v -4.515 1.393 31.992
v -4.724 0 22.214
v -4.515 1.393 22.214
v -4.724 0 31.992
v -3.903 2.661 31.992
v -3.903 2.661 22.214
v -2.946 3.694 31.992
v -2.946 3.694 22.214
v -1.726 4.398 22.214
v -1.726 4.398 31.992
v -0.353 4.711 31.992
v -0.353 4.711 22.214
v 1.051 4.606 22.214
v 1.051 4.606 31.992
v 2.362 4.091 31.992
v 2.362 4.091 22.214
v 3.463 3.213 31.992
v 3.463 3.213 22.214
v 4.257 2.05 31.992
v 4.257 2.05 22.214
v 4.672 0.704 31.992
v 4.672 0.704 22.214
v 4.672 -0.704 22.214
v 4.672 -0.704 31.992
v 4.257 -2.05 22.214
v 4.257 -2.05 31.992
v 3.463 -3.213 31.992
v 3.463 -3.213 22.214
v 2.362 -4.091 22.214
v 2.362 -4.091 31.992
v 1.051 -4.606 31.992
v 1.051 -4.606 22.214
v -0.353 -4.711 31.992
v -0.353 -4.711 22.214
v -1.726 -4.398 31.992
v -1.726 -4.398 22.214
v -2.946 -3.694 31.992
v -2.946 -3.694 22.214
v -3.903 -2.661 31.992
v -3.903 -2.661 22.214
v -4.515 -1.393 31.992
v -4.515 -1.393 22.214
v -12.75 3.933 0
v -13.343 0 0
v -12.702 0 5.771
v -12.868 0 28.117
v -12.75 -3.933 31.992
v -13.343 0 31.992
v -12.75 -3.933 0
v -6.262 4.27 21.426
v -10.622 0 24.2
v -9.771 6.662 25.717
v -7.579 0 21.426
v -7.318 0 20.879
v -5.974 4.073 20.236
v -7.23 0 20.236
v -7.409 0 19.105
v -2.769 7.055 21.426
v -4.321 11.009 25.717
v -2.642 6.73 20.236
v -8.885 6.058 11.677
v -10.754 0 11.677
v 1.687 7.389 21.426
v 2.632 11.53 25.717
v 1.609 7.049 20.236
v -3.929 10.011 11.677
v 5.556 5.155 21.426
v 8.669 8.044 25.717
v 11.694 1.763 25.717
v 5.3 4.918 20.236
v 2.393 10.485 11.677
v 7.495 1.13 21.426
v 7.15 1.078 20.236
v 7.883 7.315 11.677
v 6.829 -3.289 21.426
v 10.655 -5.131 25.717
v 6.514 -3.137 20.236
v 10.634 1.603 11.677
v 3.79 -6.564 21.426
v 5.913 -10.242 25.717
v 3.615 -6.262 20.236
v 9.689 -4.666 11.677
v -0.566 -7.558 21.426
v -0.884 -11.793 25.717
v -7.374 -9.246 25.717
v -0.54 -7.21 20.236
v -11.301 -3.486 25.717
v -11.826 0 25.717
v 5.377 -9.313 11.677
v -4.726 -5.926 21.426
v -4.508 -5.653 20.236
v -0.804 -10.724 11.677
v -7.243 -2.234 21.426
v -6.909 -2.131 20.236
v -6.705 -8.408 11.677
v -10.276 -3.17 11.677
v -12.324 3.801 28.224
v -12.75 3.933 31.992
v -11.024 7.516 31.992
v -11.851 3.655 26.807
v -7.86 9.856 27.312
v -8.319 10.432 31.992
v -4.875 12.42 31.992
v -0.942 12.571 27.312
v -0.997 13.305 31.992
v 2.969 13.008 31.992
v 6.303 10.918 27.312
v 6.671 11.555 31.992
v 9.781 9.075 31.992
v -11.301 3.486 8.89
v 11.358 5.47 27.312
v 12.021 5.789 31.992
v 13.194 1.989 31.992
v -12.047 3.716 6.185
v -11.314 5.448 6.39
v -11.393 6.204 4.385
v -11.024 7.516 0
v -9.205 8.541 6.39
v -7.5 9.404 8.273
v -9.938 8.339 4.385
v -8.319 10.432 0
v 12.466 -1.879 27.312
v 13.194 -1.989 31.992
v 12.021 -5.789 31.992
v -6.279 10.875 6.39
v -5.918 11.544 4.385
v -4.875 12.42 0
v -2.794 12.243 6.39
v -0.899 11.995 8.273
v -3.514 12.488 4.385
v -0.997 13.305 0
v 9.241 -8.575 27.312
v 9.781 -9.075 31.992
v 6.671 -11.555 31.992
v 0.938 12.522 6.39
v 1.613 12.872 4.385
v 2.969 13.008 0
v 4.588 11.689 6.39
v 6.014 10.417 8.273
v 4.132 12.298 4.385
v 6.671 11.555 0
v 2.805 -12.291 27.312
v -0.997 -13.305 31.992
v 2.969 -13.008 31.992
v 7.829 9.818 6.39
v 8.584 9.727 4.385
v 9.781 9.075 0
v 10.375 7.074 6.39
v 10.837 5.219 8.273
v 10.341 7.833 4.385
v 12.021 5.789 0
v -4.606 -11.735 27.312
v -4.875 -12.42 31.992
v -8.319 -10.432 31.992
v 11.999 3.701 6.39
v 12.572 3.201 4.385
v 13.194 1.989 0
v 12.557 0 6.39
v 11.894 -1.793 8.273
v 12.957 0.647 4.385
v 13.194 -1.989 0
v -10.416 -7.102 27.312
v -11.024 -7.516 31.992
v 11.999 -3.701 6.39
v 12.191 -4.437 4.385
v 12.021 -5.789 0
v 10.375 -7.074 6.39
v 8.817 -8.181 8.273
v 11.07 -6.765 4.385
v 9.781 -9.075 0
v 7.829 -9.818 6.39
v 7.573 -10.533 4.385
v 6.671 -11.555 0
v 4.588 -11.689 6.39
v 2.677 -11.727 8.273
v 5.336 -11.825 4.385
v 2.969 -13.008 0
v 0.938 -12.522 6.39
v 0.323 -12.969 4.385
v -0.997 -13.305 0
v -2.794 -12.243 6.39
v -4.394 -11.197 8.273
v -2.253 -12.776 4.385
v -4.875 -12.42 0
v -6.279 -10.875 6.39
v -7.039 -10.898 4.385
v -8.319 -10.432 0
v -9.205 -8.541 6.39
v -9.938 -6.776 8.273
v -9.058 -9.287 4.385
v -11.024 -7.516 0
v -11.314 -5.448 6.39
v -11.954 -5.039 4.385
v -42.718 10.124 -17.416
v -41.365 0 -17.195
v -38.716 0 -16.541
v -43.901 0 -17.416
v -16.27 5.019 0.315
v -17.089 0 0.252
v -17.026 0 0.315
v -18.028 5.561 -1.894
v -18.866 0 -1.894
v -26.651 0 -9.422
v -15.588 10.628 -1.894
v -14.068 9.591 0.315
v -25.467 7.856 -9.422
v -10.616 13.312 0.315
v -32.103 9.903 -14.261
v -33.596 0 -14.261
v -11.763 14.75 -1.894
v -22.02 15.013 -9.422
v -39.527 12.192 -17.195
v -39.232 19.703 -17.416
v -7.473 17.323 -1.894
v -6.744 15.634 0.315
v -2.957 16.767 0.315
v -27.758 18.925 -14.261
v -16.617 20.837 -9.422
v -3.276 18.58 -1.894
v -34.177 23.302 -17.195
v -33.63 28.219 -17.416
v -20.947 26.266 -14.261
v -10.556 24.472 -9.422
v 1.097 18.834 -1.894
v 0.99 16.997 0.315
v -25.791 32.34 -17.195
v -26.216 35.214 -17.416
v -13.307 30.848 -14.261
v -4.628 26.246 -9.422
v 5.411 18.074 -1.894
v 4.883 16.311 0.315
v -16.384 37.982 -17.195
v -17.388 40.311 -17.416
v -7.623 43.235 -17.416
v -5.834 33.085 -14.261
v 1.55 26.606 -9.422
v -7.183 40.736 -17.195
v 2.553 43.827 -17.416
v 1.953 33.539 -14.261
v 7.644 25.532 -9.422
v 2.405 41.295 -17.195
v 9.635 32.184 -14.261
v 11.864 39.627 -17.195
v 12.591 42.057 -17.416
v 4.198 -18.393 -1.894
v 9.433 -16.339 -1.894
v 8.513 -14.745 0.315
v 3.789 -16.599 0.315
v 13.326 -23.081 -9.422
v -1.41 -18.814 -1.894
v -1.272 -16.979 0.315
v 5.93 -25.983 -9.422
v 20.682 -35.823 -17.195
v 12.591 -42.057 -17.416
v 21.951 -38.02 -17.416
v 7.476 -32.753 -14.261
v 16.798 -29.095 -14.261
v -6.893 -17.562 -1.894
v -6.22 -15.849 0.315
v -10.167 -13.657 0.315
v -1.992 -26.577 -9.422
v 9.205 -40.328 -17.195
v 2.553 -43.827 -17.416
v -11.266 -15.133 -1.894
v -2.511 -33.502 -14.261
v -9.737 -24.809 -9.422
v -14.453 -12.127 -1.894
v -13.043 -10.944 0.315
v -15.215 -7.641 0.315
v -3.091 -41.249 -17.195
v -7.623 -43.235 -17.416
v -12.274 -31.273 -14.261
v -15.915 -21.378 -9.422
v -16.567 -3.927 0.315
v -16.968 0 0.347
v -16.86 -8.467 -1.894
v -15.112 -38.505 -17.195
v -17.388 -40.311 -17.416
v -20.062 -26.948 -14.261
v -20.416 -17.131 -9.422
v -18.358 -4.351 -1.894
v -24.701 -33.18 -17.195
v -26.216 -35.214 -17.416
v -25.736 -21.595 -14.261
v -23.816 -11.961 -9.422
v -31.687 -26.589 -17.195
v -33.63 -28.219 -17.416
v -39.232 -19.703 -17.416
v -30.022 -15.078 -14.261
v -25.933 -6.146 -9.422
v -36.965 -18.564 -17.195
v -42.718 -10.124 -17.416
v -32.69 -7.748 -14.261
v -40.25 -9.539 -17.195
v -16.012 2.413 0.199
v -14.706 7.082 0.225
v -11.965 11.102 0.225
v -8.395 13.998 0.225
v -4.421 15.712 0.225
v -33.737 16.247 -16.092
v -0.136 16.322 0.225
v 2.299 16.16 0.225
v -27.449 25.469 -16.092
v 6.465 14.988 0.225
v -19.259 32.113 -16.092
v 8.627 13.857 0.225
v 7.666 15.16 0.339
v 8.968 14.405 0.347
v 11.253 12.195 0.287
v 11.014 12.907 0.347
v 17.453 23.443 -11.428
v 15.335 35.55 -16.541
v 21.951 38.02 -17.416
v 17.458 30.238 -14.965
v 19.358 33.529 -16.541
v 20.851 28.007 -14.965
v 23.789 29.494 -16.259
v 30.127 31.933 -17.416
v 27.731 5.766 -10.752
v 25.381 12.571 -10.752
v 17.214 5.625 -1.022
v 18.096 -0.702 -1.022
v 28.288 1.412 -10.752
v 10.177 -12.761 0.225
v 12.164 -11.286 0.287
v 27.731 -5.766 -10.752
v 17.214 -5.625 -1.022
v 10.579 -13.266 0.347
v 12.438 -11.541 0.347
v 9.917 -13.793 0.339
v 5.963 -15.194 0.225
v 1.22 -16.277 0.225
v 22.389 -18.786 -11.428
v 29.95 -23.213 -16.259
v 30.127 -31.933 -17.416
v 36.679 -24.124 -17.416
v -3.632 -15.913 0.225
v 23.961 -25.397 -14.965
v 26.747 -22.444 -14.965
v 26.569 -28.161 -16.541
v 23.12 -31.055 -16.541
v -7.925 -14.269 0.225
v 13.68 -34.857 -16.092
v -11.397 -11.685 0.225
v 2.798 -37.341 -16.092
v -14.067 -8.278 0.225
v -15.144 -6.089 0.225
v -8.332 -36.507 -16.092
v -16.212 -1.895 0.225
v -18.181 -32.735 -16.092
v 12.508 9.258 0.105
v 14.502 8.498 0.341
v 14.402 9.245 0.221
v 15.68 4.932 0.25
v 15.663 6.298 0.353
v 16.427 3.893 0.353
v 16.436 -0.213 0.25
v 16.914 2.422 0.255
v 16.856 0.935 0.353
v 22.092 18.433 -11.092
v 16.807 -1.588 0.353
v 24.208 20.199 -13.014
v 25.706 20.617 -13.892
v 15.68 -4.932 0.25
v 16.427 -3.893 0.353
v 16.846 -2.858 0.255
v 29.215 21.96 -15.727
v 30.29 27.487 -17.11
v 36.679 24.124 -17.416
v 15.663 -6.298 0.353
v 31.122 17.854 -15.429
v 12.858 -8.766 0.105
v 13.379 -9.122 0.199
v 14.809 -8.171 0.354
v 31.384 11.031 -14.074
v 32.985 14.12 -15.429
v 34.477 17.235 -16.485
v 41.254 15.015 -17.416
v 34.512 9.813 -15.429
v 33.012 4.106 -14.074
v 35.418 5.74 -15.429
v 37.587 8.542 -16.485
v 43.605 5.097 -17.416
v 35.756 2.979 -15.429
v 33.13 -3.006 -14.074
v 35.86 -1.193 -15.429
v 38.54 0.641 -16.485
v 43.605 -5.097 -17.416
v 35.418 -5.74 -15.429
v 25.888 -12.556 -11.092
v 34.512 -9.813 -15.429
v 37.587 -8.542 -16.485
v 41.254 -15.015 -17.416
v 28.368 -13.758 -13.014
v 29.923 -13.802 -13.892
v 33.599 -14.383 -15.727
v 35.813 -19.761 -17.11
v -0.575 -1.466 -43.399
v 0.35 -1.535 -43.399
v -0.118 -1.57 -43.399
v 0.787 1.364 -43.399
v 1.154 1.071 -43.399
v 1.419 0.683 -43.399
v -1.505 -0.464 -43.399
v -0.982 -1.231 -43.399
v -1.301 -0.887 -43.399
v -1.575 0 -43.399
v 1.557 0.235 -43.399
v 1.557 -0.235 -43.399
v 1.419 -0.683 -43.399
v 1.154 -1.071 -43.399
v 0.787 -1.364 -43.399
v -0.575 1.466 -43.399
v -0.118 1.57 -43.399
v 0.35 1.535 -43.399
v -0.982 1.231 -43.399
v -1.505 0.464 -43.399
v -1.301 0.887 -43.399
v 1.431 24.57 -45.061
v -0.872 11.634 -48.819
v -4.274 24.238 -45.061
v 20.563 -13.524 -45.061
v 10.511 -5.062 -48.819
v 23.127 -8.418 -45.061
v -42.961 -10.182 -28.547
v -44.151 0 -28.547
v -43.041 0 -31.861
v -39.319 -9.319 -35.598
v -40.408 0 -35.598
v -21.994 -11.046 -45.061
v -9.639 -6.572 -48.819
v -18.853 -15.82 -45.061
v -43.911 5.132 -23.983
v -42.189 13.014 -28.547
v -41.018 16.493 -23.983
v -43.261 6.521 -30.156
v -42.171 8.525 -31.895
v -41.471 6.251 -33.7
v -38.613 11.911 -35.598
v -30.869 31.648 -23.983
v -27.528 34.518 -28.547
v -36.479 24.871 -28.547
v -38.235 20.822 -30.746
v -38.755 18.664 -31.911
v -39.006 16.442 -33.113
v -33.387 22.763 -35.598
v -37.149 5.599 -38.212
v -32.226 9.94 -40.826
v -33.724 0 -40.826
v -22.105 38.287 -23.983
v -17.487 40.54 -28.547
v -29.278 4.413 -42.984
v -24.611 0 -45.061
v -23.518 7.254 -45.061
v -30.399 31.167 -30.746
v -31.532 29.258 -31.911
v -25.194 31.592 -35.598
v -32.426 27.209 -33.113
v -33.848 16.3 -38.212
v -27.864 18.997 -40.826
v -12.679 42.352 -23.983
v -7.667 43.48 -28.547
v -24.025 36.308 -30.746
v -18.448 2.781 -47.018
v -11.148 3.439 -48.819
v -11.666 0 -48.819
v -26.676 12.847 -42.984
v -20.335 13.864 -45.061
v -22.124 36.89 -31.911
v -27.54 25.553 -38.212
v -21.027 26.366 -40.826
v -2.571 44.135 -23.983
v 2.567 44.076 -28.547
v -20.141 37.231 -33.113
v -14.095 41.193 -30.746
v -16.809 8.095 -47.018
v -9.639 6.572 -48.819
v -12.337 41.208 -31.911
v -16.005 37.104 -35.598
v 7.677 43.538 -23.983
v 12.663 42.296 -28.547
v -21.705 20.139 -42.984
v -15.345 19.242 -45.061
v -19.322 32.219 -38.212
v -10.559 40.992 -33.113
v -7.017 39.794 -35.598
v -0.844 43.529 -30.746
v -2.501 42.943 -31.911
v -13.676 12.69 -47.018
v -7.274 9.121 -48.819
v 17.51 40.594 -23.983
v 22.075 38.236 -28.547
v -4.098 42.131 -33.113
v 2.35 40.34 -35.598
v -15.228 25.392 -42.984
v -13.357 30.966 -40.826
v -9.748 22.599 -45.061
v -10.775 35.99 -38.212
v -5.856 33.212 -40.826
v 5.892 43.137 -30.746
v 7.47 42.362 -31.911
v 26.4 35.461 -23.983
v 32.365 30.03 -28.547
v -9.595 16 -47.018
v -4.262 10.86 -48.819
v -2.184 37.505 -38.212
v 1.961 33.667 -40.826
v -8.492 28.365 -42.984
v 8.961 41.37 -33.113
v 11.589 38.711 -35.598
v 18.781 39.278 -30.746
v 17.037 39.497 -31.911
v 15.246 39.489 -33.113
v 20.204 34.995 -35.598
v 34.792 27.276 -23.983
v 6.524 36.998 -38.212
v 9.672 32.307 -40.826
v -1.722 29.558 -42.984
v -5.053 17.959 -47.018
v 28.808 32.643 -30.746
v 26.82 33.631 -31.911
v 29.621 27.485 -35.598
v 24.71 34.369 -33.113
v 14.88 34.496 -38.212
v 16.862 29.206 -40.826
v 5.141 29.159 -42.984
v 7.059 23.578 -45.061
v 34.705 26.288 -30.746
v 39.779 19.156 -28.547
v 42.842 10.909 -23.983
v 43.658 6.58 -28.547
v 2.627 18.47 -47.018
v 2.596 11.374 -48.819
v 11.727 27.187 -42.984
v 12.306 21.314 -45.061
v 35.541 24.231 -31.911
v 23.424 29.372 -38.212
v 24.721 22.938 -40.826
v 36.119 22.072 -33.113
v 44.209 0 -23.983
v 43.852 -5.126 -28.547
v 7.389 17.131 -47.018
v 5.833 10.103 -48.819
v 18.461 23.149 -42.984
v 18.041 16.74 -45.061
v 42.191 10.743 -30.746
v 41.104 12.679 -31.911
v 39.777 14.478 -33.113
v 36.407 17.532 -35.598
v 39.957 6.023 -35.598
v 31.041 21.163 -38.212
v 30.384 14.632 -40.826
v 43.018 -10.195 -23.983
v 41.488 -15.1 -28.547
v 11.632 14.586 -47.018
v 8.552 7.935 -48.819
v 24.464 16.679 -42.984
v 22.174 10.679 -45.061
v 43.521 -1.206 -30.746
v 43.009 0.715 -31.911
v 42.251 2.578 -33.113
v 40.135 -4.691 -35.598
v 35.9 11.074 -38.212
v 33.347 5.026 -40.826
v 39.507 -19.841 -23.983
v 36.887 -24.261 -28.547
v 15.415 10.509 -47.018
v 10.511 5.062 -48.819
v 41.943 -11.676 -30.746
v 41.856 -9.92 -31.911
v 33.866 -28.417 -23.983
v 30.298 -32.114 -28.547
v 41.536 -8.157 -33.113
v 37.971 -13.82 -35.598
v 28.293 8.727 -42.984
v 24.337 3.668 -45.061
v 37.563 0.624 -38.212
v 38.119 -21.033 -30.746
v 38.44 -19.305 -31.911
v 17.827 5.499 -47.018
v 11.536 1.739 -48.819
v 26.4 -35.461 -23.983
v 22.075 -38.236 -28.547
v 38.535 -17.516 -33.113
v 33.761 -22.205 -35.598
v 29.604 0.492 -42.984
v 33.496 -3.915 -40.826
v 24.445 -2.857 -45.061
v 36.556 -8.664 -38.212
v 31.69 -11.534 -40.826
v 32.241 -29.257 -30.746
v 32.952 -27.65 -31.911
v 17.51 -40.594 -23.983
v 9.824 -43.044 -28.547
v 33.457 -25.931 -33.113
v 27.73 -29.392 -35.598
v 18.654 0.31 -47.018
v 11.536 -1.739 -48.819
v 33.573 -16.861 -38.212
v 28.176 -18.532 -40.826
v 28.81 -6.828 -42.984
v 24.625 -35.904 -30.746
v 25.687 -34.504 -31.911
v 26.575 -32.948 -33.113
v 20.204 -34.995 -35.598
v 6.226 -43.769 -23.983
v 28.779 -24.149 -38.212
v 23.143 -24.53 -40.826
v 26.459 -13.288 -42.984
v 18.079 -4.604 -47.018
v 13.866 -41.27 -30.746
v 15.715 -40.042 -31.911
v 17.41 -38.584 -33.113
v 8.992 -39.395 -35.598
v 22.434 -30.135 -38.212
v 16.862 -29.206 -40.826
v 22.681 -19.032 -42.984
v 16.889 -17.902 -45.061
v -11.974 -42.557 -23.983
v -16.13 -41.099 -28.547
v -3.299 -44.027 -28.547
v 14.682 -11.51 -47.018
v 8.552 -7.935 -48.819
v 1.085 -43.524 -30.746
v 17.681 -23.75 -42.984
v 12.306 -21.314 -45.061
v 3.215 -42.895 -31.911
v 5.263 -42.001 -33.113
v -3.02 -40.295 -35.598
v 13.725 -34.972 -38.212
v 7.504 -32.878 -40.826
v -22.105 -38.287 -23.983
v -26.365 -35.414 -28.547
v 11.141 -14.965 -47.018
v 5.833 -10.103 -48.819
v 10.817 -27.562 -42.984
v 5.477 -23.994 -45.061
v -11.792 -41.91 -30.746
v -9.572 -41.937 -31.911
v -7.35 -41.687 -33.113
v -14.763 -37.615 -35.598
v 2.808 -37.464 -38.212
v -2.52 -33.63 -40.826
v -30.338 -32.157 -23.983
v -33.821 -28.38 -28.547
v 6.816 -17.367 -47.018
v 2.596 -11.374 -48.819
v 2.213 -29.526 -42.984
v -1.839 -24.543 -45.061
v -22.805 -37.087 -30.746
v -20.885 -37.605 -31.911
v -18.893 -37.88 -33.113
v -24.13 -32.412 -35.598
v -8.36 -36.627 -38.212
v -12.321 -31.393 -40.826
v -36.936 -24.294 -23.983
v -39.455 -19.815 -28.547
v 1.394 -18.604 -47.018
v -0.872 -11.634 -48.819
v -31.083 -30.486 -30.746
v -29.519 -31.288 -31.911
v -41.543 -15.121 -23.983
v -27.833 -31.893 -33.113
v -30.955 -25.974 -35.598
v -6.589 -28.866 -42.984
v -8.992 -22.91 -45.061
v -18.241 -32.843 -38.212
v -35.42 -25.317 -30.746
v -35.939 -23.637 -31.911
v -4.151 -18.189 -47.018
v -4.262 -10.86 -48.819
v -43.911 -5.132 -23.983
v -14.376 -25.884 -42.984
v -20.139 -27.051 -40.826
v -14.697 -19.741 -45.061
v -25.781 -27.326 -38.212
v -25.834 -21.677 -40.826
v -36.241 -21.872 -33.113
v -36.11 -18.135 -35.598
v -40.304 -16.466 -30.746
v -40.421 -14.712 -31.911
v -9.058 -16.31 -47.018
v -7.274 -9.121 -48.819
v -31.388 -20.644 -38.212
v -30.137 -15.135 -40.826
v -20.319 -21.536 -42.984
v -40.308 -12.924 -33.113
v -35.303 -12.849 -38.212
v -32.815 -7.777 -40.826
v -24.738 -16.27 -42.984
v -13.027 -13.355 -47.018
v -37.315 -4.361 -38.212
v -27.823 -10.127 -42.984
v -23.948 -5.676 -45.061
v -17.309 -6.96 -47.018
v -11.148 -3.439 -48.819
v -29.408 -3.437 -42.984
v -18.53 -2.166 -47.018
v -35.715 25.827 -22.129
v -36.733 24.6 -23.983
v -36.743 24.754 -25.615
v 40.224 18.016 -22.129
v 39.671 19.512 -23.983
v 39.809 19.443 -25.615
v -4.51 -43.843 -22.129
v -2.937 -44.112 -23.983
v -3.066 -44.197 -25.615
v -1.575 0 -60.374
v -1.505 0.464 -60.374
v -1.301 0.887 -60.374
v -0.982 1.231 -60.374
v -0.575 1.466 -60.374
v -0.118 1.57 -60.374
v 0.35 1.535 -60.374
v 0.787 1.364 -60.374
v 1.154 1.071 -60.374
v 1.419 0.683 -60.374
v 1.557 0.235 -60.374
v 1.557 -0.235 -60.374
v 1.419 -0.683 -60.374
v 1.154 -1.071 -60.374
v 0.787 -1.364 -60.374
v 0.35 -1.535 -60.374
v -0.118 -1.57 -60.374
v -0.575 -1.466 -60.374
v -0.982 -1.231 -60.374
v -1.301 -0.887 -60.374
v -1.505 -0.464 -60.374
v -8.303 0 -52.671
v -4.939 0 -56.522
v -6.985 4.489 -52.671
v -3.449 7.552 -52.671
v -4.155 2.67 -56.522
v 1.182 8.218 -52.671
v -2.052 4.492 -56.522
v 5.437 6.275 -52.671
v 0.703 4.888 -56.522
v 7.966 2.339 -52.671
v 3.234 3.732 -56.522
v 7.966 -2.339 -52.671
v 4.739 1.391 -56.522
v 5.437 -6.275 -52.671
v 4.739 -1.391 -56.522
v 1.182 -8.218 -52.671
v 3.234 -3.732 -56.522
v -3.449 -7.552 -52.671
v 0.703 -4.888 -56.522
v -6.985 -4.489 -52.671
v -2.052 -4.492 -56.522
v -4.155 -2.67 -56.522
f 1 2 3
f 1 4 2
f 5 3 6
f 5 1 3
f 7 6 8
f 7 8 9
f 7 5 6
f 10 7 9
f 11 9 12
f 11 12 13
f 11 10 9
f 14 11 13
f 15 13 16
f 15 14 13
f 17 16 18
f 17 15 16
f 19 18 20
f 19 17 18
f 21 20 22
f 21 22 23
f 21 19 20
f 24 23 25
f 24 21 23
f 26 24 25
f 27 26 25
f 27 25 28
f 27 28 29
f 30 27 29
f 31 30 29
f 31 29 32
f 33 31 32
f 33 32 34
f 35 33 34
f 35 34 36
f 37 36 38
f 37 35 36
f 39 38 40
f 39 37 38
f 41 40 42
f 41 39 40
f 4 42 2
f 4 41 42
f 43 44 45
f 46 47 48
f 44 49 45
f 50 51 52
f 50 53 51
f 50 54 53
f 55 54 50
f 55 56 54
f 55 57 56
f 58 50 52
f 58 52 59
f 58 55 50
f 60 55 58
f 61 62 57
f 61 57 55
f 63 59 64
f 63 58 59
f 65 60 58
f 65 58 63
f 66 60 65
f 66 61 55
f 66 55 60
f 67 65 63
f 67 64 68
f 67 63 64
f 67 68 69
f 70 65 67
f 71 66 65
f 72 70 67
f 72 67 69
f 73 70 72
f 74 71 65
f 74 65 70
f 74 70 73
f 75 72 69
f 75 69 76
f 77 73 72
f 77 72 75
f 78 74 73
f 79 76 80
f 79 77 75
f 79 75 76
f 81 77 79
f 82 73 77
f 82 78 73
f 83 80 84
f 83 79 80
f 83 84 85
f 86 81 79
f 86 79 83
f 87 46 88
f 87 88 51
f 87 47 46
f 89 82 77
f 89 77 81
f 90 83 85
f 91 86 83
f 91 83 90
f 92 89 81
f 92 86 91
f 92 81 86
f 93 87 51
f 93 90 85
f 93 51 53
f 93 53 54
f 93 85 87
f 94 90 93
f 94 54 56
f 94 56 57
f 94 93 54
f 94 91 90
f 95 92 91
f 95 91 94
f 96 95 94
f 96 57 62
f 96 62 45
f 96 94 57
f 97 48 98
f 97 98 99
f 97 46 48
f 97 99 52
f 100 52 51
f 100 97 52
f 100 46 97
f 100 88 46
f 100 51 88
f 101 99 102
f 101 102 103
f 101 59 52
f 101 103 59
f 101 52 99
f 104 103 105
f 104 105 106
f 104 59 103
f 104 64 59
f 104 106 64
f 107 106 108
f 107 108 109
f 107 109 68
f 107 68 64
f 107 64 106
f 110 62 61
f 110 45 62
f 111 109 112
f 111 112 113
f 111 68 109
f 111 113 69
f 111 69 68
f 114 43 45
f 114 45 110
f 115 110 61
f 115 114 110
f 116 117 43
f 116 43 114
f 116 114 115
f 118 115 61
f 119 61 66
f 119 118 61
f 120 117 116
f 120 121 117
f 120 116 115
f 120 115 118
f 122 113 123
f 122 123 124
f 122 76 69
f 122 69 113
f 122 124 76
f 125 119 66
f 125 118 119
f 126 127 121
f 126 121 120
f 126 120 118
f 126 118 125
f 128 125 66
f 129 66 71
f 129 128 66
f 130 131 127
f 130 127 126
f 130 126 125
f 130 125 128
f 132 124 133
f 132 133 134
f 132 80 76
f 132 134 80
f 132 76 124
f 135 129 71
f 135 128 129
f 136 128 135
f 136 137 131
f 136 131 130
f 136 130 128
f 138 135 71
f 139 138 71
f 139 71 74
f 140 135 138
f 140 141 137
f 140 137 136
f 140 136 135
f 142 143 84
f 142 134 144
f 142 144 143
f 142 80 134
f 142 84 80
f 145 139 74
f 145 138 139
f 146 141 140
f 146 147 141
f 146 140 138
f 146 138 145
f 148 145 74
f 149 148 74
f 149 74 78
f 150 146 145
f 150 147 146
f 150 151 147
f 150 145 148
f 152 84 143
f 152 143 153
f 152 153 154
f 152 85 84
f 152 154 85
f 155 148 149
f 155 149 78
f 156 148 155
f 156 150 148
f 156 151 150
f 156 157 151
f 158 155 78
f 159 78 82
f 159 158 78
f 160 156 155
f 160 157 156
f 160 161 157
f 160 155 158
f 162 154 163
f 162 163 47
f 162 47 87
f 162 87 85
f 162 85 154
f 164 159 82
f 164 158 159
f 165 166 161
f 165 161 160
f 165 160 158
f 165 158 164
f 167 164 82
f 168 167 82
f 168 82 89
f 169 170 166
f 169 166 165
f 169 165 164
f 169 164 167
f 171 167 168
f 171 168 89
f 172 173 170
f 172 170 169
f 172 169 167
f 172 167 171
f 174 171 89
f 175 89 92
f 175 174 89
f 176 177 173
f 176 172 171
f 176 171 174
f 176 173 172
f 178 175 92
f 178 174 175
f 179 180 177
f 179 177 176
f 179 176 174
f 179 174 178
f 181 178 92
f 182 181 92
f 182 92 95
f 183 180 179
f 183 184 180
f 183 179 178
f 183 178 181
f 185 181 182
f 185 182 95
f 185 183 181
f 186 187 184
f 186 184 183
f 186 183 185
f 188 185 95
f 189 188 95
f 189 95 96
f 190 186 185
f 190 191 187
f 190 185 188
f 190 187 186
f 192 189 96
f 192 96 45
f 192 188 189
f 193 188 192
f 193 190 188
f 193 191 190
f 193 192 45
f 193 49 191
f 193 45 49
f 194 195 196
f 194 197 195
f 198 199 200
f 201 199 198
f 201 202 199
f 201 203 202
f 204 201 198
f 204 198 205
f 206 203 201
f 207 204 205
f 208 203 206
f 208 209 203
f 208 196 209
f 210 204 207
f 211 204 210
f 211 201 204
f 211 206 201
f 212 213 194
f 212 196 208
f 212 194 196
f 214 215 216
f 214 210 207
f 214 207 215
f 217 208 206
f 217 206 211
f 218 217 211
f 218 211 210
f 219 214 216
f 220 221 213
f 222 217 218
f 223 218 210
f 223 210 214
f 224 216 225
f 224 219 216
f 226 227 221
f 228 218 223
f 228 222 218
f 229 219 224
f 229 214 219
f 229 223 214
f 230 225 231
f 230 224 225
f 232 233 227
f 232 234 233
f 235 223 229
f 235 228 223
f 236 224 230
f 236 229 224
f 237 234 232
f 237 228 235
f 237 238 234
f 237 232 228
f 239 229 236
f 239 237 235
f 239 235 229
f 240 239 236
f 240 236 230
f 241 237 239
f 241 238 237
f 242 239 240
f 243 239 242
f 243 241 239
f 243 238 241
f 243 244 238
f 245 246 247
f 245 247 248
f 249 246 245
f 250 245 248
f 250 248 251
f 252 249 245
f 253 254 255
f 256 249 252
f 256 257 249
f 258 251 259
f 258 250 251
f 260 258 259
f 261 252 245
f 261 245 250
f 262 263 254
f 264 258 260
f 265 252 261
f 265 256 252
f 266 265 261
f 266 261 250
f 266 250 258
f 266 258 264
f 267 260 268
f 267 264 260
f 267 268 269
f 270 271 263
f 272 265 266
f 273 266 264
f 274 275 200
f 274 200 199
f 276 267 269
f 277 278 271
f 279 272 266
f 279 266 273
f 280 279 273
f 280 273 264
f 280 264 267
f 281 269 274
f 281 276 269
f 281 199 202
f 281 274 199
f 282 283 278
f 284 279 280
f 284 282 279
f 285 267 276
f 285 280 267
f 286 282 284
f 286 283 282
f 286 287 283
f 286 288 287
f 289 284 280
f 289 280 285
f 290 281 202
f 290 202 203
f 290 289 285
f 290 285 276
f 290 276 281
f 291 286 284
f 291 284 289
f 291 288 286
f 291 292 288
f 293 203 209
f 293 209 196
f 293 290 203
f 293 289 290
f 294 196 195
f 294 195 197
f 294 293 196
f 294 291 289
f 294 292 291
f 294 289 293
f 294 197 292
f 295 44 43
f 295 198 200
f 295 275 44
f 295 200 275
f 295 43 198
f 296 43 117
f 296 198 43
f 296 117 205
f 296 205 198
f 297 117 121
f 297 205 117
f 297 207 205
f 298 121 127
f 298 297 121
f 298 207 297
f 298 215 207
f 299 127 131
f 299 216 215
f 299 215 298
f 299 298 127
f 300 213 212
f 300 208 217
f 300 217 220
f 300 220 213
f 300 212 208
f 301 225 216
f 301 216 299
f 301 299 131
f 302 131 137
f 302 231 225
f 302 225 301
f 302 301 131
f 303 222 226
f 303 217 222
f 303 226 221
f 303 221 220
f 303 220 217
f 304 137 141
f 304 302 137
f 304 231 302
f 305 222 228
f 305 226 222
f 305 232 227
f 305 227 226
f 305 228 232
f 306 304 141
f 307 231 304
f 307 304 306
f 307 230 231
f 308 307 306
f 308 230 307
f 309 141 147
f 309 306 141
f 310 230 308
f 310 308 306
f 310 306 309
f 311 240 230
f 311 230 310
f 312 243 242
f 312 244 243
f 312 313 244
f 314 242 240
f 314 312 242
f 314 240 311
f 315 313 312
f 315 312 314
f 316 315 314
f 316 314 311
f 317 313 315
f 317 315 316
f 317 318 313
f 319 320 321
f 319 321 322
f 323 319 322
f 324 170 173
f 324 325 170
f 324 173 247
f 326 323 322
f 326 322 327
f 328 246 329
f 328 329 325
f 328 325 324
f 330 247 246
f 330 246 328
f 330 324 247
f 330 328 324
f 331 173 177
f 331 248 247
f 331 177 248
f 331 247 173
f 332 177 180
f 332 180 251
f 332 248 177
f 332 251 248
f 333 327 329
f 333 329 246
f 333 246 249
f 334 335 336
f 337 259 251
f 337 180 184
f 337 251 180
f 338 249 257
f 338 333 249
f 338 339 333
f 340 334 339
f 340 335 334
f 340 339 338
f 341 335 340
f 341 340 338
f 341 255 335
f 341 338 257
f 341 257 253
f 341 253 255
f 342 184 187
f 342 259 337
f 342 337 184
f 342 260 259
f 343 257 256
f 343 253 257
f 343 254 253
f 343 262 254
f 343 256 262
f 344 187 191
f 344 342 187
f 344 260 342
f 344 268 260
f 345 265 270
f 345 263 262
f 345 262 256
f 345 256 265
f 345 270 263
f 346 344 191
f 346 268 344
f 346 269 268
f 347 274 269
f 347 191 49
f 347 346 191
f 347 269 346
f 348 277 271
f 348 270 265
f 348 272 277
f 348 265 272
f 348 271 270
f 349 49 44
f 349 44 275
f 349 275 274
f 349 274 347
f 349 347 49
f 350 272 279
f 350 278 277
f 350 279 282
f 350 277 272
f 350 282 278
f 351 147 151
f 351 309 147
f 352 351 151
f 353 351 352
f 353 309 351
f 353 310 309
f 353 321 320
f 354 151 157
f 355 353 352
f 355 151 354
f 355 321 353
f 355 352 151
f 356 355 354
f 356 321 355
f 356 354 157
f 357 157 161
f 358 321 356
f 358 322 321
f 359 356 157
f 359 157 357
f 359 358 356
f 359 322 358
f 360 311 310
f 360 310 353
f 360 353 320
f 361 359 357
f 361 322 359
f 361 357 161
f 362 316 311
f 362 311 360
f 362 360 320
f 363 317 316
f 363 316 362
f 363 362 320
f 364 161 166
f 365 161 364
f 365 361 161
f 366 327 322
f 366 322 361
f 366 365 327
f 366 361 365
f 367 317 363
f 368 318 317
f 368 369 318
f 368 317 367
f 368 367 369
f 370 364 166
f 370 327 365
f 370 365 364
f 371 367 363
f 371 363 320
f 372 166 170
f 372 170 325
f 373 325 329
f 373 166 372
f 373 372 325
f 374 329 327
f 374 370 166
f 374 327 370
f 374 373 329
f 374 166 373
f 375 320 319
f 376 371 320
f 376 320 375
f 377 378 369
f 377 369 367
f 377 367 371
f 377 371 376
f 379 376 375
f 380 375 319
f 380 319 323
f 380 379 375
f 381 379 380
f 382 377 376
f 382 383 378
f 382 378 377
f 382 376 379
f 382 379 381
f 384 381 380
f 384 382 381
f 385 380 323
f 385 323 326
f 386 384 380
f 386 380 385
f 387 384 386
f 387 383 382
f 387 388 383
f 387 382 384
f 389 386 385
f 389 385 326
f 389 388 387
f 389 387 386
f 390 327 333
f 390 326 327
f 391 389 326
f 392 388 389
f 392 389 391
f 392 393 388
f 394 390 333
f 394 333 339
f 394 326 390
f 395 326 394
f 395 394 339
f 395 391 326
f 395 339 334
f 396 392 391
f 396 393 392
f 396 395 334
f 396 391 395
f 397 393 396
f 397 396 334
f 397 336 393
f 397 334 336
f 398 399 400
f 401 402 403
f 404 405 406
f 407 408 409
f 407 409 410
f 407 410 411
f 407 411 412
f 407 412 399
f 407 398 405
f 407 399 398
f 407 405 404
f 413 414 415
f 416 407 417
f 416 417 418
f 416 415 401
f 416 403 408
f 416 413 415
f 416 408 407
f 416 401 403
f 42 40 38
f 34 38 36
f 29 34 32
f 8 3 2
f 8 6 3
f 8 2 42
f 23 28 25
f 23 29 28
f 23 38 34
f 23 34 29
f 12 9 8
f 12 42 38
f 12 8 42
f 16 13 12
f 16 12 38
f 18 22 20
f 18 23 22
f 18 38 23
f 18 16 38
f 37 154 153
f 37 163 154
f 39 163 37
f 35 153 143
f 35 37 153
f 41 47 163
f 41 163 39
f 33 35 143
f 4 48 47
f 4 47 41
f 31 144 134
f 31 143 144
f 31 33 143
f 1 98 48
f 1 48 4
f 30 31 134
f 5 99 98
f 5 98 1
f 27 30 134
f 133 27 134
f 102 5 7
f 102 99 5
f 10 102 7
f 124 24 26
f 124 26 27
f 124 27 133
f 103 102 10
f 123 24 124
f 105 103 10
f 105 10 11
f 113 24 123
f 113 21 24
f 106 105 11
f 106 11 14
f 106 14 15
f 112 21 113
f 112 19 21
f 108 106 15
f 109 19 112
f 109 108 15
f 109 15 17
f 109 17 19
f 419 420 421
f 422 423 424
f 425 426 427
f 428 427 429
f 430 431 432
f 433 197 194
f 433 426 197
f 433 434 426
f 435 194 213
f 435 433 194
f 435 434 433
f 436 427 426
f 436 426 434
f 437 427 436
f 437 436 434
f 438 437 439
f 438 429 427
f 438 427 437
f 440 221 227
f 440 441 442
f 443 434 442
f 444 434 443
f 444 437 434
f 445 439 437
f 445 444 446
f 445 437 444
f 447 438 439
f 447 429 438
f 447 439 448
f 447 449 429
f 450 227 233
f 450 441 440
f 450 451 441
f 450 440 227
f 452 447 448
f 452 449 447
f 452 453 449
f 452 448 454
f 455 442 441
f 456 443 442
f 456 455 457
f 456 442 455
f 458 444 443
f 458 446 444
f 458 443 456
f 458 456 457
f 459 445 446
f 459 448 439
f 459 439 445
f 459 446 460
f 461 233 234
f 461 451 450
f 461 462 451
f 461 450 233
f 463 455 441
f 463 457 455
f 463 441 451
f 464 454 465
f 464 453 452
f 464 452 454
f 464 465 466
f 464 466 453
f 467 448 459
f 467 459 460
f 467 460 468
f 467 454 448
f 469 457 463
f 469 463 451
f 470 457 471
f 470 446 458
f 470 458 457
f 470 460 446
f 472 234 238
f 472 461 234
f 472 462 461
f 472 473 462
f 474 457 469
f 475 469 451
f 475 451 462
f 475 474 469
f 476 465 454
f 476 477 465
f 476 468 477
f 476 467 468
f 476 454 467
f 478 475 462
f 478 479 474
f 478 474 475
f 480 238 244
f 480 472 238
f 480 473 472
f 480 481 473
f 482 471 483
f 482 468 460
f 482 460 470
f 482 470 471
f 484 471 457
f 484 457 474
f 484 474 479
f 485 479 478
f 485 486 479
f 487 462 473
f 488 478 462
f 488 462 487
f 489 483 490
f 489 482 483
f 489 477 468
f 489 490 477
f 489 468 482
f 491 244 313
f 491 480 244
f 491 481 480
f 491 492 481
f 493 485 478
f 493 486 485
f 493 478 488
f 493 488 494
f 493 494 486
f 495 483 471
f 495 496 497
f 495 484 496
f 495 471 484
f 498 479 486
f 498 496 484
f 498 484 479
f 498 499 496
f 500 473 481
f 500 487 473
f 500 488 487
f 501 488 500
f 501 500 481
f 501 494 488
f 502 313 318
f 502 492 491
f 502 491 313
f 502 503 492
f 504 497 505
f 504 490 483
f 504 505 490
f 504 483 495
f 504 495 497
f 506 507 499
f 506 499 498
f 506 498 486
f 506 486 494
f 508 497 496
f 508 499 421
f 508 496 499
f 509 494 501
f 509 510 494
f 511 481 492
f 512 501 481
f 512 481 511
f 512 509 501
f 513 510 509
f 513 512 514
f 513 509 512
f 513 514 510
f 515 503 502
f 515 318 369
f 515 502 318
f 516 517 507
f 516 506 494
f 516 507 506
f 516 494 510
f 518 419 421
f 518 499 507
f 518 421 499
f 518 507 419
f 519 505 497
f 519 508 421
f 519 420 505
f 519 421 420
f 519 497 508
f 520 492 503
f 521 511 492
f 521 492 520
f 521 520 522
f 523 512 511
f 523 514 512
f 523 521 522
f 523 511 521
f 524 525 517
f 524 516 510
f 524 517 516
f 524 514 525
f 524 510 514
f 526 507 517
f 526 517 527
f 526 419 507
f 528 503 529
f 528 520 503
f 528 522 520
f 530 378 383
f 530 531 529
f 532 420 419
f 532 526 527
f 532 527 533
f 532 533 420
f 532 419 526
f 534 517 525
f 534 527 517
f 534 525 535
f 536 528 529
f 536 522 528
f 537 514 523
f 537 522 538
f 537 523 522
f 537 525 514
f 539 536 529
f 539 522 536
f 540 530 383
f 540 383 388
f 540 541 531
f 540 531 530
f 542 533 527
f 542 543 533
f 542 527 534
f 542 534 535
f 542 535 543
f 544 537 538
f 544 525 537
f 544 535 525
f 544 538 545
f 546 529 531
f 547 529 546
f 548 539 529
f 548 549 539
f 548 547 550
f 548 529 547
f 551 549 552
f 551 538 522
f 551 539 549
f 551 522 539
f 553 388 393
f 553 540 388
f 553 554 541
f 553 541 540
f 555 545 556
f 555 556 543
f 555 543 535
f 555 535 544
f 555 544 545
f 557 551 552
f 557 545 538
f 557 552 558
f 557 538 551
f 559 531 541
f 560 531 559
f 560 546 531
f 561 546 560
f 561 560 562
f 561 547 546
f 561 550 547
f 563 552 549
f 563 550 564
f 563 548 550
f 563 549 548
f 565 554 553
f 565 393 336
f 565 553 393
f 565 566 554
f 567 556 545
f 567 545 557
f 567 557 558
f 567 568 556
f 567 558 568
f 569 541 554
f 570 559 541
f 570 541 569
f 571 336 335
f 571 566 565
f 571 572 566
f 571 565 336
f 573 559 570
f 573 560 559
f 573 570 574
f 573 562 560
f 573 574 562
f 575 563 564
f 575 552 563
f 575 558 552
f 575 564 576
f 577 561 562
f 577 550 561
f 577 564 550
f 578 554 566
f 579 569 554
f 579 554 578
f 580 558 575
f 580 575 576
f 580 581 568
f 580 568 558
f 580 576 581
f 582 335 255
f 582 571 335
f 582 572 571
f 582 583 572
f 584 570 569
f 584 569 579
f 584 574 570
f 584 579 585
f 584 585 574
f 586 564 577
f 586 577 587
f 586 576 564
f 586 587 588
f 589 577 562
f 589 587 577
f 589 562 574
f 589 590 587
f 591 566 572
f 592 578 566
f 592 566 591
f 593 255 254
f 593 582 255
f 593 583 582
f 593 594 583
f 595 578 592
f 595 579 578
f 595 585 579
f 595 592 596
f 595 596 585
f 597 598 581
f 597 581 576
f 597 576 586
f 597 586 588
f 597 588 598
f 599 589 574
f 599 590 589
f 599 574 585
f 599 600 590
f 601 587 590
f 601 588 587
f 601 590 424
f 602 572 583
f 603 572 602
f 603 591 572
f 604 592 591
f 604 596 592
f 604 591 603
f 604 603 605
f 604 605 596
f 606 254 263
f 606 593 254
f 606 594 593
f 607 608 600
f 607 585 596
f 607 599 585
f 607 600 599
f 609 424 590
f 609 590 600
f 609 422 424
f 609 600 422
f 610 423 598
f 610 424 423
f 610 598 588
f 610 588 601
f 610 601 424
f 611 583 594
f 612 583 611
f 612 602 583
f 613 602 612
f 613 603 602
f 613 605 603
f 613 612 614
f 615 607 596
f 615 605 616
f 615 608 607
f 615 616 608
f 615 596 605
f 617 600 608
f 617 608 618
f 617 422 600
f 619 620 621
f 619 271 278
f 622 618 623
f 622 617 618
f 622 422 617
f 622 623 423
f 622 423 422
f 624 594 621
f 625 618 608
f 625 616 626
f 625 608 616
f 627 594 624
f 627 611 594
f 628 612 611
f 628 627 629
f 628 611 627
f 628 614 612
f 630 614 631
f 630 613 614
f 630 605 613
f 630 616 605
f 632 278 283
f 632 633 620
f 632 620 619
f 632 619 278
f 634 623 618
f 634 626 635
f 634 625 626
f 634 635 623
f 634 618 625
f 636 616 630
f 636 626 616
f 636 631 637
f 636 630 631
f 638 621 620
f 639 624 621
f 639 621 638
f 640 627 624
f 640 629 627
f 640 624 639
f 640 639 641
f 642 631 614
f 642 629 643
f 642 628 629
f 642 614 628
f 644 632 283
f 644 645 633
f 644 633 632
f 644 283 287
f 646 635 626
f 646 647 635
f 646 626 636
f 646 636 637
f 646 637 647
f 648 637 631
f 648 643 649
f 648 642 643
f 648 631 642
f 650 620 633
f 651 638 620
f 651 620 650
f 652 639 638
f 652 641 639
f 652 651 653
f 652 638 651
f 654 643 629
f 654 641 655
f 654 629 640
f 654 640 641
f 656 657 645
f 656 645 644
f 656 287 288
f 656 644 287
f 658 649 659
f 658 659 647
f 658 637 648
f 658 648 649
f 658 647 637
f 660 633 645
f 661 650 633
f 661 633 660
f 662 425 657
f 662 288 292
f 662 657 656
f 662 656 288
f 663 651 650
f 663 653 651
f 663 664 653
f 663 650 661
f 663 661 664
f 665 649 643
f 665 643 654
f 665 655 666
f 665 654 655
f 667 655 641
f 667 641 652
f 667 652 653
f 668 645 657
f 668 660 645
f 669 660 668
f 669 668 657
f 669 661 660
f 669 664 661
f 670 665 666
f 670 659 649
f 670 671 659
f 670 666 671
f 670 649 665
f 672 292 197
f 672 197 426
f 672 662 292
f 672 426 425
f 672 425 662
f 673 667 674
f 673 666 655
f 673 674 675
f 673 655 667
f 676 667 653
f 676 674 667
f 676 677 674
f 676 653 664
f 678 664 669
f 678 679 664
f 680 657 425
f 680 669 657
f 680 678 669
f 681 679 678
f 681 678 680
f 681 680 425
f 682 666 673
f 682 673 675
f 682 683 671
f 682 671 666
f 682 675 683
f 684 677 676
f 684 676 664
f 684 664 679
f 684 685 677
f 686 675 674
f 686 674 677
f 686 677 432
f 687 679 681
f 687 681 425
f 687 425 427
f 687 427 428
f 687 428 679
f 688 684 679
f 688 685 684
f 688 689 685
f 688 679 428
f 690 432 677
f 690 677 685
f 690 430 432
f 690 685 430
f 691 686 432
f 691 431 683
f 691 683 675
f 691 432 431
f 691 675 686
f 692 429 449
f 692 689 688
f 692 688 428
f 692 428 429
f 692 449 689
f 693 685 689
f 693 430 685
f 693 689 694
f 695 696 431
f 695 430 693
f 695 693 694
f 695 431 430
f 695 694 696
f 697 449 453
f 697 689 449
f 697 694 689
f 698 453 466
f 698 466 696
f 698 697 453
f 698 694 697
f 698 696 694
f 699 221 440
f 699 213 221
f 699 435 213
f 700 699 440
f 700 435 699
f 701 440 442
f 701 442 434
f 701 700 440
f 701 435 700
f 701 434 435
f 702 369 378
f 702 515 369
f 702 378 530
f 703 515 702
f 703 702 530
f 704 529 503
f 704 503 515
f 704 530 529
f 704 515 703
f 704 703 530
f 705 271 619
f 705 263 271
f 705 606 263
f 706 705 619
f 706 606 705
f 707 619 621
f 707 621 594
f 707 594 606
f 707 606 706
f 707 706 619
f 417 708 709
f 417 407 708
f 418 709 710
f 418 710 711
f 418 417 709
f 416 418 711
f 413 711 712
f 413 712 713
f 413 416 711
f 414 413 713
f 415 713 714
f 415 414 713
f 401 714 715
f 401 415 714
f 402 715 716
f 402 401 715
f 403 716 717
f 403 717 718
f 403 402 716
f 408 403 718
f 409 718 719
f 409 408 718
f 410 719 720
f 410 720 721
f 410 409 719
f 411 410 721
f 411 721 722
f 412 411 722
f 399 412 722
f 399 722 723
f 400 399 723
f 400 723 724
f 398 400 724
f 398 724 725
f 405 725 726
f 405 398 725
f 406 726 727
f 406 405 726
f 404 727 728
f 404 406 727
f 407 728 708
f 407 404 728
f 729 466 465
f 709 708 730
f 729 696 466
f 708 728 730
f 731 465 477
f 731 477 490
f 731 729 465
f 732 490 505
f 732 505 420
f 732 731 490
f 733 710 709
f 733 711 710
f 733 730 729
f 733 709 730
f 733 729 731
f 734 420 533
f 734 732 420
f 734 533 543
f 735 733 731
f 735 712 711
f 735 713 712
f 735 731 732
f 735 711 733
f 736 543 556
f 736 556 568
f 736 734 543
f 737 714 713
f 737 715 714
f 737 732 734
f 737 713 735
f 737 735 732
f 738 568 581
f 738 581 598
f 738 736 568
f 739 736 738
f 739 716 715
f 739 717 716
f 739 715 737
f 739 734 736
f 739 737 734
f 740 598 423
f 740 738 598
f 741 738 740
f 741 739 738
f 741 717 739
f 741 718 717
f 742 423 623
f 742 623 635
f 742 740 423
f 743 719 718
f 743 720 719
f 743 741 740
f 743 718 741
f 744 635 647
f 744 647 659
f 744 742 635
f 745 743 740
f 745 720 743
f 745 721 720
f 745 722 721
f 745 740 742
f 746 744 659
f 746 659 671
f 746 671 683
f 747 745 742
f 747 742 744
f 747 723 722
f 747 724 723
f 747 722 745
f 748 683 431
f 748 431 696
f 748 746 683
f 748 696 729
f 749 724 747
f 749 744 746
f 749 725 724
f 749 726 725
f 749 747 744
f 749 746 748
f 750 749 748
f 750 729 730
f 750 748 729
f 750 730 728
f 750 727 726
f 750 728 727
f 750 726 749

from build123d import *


with BuildPart() as f1:
    # F0 (on Front) → F1 (revolve)
    with BuildSketch(Plane.XZ):
        with BuildLine():
            Line((-4.7244, 22.2135692715), (-4.7244, 31.992048953))
            Line((-4.7244, 31.992048953), (-13.342611617, 31.992048953))
            add(Edge.make_bspline(
                [(-13.342611617, 31.992048953), (-13.342611617, 23.5793488524), (-1.0692011531, 22.8583890072), (-13.342611617, 11.0273414279), (-13.342611617, 0)],
                knots=[0, 0, 0, 0, 0.4327511383, 1, 1, 1, 1], degree=3))
            add(Edge.make_bspline(
                [(-13.342611617, 0), (-17.4872809604, 0), (-14.3756415327, 3.0636816489), (-32.1211119987, -17.4157902899), (-43.9014959254, -17.4157902899)],
                knots=[0, 0, 0, 0, 0.2602609406, 1, 1, 1, 1], degree=3))
            add(Edge.make_bspline(
                [(-43.9014959254, -17.4157902899), (-43.9014959254, -23.6700399748), (-46.479454718, -30.9273813002), (-34.8771613997, -43.5499729392), (-11.6664659152, -48.8192164691)],
                knots=[0, 0, 0, 0, 0.3635984427, 1, 1, 1, 1], degree=3))
            Line((-11.6664659152, -48.8192164691), (-1.5748, -60.3738563937))
            Line((-1.5748, -60.3738563937), (-1.5748, -43.3994084597))
            Line((-1.5748, -43.3994084597), (0, -43.3994084597))
            Line((0, -43.3994084597), (0, 22.2135692715))
            Line((0, 22.2135692715), (-4.7244, 22.2135692715))
        make_face()
    revolve(axis=Axis((0, 0, -10.5929195941), (0, 0, -1)))


solid = f1.part
